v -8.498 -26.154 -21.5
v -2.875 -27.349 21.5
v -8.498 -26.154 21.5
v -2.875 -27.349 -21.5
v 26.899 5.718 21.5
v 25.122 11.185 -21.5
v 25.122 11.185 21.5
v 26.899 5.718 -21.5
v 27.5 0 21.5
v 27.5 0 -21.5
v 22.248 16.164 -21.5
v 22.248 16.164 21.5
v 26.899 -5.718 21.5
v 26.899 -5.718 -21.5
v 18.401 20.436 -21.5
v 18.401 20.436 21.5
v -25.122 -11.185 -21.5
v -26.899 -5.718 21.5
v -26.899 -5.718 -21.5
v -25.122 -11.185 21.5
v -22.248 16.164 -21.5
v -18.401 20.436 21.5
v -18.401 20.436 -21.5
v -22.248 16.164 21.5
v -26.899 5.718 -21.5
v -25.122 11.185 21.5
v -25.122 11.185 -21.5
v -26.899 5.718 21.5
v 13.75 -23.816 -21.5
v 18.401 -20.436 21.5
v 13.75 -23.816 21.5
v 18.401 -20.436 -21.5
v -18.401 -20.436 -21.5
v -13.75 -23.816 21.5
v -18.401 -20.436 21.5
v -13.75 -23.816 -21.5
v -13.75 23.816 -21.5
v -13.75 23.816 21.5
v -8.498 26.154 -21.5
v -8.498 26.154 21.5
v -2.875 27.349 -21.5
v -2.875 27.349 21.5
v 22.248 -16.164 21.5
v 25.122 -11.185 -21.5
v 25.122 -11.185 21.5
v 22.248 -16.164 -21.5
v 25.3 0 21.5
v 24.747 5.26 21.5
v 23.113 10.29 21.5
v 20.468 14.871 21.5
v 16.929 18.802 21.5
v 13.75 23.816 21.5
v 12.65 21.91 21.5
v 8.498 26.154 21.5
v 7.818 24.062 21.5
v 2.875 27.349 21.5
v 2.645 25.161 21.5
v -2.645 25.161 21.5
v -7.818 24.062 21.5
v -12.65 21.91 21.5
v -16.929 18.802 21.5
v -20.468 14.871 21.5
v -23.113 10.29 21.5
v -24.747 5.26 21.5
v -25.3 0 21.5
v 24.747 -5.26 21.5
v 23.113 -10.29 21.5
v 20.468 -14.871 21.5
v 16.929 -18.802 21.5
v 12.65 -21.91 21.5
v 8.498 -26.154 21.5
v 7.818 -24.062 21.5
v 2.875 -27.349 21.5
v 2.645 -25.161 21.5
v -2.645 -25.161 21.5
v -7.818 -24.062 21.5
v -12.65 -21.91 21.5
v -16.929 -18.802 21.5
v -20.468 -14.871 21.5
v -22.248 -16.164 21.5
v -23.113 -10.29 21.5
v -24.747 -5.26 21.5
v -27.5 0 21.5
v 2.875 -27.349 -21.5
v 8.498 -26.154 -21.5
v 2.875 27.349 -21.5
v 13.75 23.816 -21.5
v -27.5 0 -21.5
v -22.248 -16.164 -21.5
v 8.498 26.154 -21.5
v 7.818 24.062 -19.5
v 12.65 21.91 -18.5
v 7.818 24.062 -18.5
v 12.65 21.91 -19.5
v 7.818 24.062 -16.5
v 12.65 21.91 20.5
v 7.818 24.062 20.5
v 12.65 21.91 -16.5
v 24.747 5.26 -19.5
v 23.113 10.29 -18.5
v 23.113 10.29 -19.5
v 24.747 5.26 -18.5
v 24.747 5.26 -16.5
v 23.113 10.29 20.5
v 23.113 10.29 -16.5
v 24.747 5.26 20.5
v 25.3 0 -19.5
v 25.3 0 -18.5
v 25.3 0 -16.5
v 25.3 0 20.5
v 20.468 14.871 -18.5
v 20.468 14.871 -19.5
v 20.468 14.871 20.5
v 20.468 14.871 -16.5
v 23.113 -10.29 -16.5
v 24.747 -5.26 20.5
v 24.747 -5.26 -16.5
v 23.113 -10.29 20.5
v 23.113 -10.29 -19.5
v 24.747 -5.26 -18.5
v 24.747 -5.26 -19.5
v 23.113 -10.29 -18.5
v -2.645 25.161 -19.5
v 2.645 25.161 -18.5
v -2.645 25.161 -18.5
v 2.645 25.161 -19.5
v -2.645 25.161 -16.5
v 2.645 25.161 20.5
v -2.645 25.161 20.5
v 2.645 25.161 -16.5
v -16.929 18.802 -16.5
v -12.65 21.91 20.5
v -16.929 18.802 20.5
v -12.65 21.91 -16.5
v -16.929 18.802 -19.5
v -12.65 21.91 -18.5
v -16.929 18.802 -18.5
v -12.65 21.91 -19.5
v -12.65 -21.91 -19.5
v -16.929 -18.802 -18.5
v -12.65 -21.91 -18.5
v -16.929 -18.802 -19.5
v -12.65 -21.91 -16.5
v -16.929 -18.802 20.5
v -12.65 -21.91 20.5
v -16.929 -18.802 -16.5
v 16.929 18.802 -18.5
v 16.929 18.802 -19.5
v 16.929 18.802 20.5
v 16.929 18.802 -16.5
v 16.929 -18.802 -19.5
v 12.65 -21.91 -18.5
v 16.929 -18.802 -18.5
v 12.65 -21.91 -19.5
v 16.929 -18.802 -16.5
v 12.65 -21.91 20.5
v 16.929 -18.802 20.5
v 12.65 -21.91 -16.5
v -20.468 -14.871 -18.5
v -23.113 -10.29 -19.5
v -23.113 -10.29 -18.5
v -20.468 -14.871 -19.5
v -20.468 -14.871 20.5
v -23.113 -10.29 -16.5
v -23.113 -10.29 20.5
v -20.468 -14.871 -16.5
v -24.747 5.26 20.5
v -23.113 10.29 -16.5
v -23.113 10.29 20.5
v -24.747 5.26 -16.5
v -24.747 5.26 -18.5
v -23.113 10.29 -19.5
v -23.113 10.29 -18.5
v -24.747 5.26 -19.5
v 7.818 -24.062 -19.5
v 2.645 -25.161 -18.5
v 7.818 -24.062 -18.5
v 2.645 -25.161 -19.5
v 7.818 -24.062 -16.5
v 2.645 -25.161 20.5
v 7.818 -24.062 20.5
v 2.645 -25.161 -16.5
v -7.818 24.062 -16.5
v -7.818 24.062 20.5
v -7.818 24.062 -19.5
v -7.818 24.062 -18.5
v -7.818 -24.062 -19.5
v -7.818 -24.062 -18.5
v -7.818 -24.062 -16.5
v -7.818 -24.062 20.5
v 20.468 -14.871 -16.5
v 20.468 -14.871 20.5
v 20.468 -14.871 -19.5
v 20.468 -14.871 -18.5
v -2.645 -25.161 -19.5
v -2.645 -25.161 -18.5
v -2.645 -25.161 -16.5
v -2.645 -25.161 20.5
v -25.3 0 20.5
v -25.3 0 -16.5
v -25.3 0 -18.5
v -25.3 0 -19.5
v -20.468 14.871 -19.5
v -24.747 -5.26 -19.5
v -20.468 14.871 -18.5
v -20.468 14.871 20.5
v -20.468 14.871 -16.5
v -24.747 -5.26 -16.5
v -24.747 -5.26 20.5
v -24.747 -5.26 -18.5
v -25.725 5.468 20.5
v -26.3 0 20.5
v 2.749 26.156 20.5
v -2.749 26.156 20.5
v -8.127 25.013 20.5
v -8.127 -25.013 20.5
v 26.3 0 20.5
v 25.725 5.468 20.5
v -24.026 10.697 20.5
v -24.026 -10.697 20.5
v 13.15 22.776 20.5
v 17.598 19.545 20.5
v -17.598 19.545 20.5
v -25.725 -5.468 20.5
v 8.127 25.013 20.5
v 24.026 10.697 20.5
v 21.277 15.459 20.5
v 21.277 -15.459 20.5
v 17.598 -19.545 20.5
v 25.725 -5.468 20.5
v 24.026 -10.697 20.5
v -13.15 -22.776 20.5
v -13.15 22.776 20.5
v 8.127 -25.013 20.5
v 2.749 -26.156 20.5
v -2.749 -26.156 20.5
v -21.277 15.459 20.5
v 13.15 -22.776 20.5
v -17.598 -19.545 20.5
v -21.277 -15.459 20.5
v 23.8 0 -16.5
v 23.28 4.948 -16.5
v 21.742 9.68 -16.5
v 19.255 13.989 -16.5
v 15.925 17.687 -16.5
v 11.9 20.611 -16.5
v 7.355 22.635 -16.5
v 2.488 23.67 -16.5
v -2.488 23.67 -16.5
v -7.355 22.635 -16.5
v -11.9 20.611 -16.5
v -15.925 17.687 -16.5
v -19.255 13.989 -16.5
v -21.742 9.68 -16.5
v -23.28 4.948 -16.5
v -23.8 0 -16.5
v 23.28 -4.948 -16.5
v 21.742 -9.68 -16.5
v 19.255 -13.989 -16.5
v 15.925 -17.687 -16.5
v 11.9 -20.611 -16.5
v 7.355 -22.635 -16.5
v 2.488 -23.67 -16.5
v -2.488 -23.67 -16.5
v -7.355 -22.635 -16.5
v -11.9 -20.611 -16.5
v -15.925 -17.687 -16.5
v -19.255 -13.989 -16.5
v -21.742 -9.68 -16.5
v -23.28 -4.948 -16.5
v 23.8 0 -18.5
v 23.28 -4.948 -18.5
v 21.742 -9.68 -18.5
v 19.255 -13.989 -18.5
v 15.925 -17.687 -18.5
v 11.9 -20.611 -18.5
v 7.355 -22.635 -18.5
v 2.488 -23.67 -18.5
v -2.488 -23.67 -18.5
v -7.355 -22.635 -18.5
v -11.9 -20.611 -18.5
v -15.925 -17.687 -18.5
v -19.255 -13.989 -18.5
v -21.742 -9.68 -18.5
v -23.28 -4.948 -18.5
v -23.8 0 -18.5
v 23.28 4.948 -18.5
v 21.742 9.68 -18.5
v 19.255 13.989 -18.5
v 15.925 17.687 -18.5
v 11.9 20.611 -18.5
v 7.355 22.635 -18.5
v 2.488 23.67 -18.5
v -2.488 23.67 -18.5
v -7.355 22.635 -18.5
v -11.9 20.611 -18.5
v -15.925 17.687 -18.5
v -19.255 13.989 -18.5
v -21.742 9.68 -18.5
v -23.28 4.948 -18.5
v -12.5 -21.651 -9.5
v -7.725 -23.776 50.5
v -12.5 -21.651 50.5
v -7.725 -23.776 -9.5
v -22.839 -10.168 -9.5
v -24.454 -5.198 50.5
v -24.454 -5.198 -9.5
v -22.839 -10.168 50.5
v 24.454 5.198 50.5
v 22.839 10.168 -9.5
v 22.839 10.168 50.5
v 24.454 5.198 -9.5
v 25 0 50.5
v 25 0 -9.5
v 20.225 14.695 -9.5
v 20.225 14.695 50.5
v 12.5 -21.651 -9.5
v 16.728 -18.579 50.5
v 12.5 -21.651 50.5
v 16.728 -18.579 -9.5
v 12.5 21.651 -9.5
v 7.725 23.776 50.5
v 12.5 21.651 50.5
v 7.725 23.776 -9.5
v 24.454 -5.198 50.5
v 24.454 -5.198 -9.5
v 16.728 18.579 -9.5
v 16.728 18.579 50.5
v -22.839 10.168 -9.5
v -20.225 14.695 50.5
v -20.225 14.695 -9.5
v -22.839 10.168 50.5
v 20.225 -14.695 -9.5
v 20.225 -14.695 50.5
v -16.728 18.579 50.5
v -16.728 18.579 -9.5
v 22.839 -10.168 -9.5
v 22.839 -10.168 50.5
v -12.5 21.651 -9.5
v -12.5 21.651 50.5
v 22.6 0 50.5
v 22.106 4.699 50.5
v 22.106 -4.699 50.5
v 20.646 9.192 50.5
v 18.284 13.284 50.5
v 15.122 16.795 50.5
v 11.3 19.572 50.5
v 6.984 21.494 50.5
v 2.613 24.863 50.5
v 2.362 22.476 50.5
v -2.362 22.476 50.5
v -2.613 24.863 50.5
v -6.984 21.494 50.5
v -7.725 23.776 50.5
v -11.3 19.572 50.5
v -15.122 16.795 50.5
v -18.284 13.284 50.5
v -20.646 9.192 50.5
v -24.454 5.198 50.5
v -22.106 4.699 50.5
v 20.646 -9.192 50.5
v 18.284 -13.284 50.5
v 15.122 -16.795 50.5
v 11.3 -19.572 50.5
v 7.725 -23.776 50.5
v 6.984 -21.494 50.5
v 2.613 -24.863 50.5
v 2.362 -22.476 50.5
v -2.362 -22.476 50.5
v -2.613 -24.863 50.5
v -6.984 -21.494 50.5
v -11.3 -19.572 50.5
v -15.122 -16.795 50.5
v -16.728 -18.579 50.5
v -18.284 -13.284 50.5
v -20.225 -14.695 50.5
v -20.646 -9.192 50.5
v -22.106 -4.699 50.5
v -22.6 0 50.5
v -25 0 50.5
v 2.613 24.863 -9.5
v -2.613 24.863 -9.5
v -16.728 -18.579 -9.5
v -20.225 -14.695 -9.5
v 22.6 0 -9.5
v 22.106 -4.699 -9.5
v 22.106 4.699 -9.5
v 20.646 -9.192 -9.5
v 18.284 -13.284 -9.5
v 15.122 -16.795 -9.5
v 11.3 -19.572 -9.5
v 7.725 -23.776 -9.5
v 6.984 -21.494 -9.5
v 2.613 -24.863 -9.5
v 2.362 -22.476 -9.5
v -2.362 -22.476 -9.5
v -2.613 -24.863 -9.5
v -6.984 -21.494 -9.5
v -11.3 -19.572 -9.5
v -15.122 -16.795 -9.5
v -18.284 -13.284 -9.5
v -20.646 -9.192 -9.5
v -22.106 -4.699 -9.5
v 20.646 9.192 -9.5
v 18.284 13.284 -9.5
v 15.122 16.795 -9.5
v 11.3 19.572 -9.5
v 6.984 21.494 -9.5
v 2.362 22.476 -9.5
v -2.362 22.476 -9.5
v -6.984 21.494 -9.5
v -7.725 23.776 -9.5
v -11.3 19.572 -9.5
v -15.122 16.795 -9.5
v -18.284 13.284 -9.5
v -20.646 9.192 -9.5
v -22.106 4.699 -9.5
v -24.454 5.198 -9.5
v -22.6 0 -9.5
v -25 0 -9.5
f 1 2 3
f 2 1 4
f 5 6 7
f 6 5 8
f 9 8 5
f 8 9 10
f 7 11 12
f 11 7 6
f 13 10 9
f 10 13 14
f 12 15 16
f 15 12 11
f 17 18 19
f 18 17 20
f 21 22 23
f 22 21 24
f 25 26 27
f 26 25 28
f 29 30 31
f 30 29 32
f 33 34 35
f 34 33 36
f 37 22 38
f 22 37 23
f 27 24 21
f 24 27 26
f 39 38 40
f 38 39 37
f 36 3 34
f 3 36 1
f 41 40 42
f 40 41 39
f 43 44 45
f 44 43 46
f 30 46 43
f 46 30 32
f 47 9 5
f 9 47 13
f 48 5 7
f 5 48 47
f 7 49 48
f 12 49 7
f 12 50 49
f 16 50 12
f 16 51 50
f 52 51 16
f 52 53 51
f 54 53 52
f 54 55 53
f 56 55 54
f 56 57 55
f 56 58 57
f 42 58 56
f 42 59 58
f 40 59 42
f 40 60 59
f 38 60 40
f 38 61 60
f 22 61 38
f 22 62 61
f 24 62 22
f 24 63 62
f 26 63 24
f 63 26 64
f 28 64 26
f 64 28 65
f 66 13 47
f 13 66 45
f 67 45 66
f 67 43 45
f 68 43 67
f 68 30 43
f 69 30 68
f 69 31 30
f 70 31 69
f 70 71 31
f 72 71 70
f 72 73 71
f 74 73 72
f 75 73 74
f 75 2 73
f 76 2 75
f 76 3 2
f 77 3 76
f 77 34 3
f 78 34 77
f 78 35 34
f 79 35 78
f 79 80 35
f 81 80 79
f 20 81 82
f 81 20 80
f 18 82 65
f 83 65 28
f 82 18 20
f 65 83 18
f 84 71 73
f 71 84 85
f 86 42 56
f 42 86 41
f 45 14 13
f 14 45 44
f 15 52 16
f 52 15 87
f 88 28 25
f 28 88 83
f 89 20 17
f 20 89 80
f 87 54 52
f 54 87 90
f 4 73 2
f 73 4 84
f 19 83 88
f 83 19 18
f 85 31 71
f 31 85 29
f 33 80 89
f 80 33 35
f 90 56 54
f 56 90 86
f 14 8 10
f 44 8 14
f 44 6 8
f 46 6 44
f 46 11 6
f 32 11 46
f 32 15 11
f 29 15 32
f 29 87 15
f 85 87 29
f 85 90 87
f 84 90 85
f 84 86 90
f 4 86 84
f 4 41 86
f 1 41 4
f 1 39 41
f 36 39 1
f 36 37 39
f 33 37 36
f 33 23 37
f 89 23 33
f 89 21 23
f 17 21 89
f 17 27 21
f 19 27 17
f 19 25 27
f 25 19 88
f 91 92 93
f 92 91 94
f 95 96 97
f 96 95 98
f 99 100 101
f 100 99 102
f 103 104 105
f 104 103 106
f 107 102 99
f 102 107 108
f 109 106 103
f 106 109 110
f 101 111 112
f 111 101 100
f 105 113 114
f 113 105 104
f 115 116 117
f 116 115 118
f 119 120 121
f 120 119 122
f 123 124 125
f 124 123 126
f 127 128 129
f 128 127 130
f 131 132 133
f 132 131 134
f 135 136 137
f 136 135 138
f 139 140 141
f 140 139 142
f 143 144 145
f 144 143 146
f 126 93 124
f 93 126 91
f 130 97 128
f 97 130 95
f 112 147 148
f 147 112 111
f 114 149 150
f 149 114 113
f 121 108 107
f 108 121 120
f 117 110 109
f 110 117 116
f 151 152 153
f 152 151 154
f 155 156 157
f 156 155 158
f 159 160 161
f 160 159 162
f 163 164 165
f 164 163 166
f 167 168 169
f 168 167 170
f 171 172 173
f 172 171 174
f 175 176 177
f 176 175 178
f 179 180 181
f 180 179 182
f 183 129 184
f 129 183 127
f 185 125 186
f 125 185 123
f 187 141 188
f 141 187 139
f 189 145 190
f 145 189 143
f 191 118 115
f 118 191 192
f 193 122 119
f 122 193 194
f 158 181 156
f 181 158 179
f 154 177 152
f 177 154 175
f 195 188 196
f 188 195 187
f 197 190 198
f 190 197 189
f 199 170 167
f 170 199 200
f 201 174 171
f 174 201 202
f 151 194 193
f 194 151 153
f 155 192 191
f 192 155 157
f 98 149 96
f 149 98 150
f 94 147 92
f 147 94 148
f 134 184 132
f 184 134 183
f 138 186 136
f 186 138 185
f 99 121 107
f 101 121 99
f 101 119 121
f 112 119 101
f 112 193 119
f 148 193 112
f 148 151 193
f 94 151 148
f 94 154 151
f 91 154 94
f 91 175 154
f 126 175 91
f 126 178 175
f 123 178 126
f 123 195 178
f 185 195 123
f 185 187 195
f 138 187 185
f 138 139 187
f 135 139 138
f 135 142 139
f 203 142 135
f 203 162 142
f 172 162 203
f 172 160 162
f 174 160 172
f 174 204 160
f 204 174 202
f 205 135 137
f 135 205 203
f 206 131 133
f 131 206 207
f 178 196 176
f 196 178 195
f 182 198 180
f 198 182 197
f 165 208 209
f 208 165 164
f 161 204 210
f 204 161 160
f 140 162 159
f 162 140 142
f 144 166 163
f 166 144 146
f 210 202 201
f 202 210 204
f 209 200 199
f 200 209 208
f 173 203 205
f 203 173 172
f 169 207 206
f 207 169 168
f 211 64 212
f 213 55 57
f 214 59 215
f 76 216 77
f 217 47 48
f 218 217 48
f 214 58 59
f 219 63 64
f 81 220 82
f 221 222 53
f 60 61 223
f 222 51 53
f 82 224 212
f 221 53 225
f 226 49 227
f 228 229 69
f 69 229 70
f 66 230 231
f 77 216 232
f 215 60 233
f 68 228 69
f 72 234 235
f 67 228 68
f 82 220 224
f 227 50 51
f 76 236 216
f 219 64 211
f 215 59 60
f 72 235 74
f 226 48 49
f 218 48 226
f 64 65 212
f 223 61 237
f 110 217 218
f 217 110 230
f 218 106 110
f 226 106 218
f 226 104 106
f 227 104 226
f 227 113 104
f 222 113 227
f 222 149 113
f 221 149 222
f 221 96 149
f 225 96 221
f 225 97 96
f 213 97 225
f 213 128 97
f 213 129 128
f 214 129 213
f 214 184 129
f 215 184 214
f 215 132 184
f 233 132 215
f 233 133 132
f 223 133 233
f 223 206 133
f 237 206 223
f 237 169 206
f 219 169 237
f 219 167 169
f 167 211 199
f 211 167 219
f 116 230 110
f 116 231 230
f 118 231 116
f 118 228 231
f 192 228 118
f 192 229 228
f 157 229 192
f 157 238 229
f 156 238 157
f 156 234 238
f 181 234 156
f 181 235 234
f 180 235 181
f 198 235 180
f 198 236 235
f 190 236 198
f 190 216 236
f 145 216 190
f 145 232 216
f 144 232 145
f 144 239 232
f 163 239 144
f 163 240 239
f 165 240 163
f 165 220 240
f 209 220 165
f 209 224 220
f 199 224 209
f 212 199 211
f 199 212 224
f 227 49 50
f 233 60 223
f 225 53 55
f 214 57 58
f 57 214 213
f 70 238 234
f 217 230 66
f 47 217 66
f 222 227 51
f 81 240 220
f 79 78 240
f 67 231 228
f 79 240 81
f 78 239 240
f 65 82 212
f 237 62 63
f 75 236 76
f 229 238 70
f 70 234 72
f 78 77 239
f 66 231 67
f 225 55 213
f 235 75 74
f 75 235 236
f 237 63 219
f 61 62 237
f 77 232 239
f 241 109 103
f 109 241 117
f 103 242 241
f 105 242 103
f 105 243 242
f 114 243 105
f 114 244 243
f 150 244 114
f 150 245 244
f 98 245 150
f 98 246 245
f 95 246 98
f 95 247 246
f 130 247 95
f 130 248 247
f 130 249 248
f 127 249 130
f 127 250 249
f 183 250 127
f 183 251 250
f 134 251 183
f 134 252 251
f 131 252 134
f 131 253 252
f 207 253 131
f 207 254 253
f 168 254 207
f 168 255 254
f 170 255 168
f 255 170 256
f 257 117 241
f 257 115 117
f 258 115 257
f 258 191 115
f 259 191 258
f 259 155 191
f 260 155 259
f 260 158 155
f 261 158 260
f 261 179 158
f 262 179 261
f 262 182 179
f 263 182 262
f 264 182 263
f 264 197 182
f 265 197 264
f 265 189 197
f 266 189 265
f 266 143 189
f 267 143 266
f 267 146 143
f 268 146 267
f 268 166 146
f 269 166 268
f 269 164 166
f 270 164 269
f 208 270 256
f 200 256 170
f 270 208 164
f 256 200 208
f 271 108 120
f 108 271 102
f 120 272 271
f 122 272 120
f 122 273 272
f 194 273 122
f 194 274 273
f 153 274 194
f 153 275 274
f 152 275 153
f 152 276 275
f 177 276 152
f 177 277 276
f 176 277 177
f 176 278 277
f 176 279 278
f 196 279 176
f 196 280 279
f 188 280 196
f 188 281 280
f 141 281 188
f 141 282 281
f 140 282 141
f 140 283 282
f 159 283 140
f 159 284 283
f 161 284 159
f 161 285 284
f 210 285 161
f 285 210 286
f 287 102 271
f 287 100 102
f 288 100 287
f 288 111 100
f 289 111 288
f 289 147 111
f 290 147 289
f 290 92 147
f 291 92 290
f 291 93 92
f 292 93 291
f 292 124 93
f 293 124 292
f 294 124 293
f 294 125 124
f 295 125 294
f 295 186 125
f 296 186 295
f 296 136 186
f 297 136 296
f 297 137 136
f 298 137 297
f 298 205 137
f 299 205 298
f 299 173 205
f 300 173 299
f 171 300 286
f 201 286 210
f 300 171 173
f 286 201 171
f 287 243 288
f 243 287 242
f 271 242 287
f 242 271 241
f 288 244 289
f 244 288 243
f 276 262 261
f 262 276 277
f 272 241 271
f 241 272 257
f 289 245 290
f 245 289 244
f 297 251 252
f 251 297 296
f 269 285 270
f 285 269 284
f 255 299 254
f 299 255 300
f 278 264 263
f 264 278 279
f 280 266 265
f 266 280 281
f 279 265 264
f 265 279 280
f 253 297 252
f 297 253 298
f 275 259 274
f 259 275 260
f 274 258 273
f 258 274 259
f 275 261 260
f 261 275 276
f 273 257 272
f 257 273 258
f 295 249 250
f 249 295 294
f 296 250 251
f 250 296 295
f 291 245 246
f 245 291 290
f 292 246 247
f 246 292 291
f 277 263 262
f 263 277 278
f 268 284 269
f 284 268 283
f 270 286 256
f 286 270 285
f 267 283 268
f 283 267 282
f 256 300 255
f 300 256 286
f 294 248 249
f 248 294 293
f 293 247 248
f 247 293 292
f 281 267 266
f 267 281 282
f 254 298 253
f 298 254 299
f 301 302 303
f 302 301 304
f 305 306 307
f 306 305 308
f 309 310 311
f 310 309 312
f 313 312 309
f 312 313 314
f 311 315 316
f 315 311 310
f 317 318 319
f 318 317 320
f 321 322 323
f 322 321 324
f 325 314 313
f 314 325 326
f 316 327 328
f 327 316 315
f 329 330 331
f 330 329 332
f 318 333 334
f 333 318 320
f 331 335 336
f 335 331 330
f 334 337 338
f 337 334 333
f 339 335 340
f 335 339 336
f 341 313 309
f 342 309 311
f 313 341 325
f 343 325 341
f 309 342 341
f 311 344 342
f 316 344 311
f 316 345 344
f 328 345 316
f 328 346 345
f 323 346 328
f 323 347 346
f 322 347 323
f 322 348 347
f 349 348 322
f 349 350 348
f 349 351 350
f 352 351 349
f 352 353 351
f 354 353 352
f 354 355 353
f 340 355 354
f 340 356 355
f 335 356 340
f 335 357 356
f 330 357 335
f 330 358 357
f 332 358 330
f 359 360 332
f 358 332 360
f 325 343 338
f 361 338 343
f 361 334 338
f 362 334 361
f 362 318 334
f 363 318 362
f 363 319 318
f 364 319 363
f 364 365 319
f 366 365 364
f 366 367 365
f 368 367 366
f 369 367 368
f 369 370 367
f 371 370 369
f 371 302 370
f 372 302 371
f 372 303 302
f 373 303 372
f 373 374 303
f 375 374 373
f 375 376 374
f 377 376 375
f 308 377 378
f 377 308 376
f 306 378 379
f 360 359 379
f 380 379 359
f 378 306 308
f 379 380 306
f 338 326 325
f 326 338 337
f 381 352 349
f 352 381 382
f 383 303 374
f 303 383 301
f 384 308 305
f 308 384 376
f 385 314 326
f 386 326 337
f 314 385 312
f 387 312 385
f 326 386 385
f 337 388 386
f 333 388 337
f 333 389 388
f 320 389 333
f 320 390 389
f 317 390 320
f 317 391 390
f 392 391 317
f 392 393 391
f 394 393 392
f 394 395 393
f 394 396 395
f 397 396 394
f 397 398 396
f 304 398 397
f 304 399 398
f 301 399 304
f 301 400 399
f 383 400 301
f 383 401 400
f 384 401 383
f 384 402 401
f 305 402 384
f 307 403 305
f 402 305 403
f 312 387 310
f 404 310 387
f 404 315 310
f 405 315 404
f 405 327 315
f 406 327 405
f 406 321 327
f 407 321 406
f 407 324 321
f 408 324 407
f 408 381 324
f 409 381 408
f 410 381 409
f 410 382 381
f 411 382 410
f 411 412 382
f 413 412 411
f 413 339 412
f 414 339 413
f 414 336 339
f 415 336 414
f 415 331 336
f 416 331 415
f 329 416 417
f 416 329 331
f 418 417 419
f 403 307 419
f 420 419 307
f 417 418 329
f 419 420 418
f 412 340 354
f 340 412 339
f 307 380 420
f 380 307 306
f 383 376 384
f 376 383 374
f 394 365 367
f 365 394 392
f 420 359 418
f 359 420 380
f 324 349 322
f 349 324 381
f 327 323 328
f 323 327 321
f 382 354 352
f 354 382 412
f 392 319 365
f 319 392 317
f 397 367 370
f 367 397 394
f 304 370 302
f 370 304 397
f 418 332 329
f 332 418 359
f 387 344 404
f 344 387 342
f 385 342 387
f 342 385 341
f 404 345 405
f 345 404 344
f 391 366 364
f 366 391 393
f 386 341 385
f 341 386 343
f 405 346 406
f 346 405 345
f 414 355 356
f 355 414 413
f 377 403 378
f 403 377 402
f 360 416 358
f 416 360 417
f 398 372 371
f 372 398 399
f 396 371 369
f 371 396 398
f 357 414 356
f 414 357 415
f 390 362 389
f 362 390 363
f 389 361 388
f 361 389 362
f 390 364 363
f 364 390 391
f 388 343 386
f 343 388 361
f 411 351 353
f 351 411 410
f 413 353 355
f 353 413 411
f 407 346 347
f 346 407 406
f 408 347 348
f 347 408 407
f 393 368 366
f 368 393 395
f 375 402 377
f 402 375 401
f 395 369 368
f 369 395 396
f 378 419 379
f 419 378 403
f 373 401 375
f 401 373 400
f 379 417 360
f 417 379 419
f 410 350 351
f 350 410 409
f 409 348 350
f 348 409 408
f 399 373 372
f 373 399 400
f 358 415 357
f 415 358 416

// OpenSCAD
// Parameters
outer_diameter_mm = 50; //[25:100:0.1]
socket_depth_mm = 40; //[20:80:0.5]
wall_thickness_mm = 2.5; //[1.25:5:0.1]
end_wall_thickness_mm = 3; //[1.5:6:0.1]
clearance_mm = 0.3; //[0.1:1:0.05]
chamfer_mm = 1; //[0:3:0.1]
overlap_mm = 1; //[0.5:2:0.1]
stop_lip_thickness_mm = 2; //[1:4:0.1]
stop_lip_radial_mm = 1.5; //[0.5:3:0.1]
pipe_stub_length_mm = 60; //[30:120:1]
pipe_wall_mm = 2.4; //[1.2:4.8:0.1]

// HT Pipe - complete geometry
module ht_pipe() {
  color([0.85, 0.85, 0.8]) {
    difference() {
      // Outer cylinder of the pipe
      cylinder(h=pipe_stub_length_mm, r=outer_diameter_mm/2, center=true);
      // Inner cylinder of the pipe
      translate([0, 0, -overlap_mm/2])
        cylinder(h=pipe_stub_length_mm + overlap_mm, r=outer_diameter_mm/2 - pipe_wall_mm, center=true);
    }
  }
}

// Cap with socket interface
module cap_socket_interface() {
  color([0.75, 0.75, 0.77]) {
    difference() {
      // Outer cylinder of the cap
      cylinder(h=socket_depth_mm + end_wall_thickness_mm, r=outer_diameter_mm/2 + wall_thickness_mm, center=true);
      // Inner bore cylinder
      translate([0, 0, end_wall_thickness_mm/2 - overlap_mm/2])
        cylinder(h=socket_depth_mm + overlap_mm, r=outer_diameter_mm/2 + clearance_mm, center=true);
      // Chamfer cone at the mouth
      translate([0, 0, (socket_depth_mm + end_wall_thickness_mm)/2 - chamfer_mm/2])
        cylinder(h=chamfer_mm, r1=outer_diameter_mm/2 + clearance_mm + chamfer_mm, r2=outer_diameter_mm/2 + clearance_mm, center=true);
    }
  }
}

// Internal stop lip
module internal_stop_lip() {
  color([0.4, 0.4, 0.43]) {
    difference() {
      // Outer ring of the stop lip
      translate([0, 0, -((socket_depth_mm + end_wall_thickness_mm)/2) + end_wall_thickness_mm + stop_lip_thickness_mm/2])
        cylinder(h=stop_lip_thickness_mm, r=outer_diameter_mm/2 + clearance_mm, center=true);
      // Inner ring of the stop lip
      translate([0, 0, -((socket_depth_mm + end_wall_thickness_mm)/2) + end_wall_thickness_mm + stop_lip_thickness_mm/2])
        cylinder(h=stop_lip_thickness_mm + overlap_mm, r=outer_diameter_mm/2 + clearance_mm - stop_lip_radial_mm, center=true);
    }
  }
}

// Assembly
module assembly() {
  // Cap with socket interface and internal stop lip
  union() {
    cap_socket_interface();
    internal_stop_lip();
  }
  // HT Pipe
  translate([0, 0, end_wall_thickness_mm/2 + socket_depth_mm/2 - overlap_mm])
    ht_pipe();
}

assembly();
